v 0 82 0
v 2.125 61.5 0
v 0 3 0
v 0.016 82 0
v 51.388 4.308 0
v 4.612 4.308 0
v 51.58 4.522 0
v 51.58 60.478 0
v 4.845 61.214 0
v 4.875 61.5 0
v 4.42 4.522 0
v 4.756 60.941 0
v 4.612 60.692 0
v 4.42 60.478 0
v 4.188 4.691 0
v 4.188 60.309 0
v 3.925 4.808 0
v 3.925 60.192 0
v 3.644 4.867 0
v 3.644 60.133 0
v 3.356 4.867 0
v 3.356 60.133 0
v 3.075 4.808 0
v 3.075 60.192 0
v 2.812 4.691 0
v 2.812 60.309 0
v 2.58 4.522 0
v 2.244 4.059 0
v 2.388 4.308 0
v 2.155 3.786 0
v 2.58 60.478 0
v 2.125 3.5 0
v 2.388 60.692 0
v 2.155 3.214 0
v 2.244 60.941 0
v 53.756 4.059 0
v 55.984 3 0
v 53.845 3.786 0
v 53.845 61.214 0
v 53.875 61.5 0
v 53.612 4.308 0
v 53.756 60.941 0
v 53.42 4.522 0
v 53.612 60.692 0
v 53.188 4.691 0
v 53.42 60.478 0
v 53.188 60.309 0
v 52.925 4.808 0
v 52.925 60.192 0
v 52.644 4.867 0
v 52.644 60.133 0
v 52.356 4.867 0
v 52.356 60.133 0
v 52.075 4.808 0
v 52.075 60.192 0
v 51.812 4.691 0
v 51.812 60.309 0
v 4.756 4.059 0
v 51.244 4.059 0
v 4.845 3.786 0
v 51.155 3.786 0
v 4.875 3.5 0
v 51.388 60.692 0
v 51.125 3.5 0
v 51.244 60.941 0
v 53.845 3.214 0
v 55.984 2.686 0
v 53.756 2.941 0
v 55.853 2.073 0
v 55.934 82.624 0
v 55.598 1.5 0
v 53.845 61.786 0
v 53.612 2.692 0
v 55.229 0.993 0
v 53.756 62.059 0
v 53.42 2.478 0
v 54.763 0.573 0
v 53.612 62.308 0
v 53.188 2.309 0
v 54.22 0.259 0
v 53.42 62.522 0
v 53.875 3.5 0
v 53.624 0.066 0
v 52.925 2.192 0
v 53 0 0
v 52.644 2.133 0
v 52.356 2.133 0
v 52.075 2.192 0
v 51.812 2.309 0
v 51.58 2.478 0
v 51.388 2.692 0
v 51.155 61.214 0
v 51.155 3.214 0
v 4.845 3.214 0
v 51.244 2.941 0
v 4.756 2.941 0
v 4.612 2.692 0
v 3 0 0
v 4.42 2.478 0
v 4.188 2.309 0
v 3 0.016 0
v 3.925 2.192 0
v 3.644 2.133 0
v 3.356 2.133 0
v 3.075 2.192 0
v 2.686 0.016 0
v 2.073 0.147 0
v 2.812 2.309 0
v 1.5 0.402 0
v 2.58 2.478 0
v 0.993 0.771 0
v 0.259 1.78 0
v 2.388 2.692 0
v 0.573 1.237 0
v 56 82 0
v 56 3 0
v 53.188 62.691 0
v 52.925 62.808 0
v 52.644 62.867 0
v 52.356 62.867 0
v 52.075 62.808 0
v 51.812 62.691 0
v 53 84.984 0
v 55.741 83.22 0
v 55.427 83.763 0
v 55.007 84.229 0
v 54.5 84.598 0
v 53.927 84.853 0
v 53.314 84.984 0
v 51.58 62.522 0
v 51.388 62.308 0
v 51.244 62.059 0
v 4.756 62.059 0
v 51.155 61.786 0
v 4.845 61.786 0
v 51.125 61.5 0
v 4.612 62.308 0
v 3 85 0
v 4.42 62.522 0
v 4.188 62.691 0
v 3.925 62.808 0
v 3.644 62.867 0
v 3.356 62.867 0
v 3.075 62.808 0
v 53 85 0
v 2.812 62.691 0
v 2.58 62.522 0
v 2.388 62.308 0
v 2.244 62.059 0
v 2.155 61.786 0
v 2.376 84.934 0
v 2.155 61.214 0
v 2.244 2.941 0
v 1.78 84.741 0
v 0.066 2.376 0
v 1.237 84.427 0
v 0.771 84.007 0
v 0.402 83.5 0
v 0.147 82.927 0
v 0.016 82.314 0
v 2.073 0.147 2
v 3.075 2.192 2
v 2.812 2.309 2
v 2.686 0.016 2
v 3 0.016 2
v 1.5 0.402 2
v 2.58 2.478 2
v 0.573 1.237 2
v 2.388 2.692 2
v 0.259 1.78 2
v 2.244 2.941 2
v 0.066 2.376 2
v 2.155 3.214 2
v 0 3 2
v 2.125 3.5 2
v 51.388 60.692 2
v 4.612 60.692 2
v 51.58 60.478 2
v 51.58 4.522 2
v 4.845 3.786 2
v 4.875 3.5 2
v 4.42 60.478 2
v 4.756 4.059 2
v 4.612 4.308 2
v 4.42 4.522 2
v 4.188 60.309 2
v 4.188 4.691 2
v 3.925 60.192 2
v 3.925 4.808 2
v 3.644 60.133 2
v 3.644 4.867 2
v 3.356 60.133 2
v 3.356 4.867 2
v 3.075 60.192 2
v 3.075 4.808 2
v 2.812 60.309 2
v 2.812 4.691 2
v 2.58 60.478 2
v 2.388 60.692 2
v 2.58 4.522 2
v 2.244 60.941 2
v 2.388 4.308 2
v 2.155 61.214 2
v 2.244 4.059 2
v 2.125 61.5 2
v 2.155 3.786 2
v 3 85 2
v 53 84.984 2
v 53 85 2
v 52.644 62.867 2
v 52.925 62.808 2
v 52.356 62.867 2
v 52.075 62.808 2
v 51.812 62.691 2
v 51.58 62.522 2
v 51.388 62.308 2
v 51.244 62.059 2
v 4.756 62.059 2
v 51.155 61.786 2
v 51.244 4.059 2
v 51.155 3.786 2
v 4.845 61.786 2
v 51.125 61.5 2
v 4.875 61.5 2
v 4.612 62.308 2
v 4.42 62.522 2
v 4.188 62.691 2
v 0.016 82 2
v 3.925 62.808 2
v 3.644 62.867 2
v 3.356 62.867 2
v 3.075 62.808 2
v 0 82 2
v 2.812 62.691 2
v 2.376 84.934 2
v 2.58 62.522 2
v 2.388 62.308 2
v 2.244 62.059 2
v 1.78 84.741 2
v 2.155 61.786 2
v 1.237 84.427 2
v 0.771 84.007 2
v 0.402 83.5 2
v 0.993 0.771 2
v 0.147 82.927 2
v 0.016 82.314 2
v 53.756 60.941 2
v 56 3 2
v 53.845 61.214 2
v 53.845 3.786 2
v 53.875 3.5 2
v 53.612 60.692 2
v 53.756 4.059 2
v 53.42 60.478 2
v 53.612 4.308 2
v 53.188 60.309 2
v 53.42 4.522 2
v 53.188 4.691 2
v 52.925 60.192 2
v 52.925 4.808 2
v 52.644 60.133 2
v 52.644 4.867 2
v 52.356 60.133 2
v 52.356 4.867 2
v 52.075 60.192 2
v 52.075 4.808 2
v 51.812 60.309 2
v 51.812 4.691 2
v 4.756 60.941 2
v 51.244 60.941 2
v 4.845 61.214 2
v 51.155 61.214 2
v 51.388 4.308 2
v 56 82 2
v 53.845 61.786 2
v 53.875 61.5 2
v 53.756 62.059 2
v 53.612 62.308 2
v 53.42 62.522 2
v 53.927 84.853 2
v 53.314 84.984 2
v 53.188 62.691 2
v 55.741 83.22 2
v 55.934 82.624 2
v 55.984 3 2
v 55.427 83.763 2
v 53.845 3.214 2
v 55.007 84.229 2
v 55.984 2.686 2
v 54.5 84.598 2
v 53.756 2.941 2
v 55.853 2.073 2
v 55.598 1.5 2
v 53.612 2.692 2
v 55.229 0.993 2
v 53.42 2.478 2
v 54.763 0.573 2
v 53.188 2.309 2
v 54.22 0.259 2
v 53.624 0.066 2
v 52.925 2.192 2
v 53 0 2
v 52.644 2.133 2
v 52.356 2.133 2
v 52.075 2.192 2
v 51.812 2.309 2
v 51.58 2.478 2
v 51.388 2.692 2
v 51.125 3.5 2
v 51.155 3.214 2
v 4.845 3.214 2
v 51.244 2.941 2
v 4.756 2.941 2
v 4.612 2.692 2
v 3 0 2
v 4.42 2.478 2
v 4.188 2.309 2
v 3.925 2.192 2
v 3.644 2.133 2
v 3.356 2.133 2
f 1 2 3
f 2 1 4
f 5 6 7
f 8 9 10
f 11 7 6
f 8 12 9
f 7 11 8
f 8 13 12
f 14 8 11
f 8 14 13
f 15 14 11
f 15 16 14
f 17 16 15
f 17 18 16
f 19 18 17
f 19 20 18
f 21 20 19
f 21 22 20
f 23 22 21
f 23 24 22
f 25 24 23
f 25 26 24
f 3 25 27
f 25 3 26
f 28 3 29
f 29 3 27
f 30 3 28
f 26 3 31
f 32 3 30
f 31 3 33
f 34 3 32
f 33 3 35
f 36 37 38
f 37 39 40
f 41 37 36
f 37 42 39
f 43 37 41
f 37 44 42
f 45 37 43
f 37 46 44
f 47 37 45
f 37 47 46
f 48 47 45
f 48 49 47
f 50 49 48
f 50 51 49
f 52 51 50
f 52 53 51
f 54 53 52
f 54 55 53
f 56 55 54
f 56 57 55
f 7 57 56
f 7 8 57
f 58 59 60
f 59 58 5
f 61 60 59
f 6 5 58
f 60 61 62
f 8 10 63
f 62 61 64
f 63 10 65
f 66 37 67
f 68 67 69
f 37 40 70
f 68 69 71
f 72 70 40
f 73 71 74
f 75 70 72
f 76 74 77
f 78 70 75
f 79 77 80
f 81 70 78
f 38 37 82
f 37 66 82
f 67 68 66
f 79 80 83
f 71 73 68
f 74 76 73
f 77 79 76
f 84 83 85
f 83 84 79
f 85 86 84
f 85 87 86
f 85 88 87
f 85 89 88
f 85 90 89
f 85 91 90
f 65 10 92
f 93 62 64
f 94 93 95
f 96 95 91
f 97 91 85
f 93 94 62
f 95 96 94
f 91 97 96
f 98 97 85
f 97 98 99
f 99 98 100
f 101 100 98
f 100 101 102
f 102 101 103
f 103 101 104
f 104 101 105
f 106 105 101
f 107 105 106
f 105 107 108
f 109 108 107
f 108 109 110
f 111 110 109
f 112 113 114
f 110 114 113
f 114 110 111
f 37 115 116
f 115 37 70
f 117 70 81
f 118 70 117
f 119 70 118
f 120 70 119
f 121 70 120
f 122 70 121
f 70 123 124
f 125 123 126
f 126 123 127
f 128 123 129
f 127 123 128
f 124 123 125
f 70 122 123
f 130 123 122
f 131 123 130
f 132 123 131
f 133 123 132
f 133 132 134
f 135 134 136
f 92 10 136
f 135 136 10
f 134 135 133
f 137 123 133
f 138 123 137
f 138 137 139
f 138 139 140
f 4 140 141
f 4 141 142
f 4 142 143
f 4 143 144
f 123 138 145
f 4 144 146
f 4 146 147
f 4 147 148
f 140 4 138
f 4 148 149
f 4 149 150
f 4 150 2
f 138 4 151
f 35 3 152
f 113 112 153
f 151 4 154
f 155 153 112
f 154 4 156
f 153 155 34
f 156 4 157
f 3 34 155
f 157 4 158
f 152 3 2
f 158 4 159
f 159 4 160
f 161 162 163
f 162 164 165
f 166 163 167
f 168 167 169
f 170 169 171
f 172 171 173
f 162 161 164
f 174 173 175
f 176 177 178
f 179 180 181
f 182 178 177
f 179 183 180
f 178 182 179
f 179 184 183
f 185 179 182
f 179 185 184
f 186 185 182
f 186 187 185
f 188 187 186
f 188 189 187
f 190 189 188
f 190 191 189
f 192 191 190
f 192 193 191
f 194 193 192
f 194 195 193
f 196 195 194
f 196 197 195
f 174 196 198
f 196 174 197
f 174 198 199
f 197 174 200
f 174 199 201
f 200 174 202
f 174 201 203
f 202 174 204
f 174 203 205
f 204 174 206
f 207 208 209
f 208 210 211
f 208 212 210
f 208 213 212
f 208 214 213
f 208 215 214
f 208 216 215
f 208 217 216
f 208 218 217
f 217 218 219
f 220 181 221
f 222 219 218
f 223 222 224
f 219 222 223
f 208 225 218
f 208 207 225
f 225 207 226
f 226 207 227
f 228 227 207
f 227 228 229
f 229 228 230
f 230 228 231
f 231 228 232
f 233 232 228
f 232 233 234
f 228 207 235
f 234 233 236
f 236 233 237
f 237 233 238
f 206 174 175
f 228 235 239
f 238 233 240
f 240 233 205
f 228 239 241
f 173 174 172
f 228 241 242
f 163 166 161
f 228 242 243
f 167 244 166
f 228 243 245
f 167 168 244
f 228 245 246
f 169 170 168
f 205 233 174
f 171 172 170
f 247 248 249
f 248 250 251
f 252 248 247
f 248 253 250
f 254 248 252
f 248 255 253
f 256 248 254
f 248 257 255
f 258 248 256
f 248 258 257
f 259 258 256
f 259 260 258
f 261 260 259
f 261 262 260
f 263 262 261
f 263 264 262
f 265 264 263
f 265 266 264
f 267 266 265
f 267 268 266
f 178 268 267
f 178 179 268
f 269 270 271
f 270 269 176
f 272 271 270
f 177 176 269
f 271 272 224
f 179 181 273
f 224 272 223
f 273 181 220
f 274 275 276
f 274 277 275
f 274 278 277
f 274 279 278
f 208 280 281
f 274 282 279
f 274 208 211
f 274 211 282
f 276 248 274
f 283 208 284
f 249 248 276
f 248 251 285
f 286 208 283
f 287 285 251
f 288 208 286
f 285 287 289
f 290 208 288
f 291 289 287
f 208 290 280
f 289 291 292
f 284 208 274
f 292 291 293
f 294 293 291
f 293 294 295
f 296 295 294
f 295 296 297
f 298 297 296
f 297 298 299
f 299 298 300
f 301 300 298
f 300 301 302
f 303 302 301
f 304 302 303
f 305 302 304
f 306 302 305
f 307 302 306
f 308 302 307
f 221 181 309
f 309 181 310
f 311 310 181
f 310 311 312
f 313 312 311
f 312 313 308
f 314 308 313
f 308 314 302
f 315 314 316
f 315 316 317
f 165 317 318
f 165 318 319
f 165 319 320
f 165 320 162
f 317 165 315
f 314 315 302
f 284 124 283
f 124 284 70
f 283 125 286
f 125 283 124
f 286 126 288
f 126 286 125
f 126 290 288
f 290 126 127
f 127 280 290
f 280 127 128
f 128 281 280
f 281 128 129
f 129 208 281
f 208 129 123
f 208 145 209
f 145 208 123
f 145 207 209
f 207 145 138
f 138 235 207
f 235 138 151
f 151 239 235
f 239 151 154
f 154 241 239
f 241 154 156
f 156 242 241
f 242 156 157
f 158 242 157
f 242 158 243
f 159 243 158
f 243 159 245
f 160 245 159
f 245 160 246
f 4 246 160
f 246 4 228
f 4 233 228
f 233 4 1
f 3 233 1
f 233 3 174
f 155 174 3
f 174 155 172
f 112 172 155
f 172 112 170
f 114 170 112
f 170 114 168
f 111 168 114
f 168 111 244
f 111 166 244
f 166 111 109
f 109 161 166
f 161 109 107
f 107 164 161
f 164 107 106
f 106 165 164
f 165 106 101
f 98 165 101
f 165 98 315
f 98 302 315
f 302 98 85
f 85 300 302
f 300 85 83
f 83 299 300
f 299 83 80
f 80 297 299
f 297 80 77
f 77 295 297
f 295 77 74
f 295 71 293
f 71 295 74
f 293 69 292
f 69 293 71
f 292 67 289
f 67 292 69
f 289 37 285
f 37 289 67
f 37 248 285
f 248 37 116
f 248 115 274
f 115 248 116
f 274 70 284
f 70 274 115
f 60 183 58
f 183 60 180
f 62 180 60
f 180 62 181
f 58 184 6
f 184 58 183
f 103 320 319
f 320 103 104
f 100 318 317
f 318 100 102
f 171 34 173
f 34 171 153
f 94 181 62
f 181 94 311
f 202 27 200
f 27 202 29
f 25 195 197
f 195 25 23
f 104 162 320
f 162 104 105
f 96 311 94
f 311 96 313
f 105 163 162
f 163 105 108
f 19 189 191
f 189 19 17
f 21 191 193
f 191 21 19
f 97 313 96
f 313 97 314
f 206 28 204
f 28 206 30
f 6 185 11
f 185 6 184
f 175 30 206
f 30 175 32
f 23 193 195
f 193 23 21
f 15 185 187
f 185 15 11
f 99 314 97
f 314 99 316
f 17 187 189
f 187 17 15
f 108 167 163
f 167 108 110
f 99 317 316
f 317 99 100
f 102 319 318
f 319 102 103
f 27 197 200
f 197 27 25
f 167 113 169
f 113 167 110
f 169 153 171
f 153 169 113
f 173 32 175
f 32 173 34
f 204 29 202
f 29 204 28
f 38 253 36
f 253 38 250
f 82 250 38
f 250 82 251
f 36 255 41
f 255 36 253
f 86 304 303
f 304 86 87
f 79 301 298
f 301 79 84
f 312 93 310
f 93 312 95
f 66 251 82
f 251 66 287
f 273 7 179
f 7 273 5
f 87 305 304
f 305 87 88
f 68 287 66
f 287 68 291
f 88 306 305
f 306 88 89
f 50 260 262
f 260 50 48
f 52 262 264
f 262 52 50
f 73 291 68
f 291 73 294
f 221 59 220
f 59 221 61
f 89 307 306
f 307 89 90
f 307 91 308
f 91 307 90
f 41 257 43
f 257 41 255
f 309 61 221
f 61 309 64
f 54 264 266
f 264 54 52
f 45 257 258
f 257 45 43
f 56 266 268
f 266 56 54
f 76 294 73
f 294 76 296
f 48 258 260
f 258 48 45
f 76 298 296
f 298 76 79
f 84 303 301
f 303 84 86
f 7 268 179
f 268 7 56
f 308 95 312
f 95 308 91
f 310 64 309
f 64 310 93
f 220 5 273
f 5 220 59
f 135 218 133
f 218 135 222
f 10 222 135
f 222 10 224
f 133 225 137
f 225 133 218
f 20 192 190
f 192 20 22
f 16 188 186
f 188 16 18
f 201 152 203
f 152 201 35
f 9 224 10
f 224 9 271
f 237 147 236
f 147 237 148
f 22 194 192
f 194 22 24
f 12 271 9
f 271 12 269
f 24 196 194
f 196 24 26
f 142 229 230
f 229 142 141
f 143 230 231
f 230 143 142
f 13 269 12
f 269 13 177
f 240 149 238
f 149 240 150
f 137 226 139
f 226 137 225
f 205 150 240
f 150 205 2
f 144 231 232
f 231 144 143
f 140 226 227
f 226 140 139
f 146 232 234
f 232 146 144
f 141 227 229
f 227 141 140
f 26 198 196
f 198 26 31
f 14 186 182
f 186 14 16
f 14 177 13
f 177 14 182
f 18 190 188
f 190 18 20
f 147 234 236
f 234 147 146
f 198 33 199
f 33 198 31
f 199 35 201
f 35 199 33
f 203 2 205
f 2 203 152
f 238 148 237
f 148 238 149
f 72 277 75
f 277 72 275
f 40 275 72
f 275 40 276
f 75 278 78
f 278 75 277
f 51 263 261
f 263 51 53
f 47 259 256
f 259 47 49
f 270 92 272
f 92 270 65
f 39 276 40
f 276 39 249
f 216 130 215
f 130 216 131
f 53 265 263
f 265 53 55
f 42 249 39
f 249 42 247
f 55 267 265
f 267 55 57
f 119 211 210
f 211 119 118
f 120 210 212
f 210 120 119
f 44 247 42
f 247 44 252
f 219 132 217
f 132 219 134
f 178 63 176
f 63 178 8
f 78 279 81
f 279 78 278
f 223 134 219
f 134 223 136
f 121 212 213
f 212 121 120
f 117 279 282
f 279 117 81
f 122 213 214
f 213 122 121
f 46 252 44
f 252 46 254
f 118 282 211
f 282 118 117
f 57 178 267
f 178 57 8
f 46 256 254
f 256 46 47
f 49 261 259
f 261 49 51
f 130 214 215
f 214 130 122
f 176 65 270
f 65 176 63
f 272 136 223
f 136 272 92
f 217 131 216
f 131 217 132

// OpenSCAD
/*
Rasperrby Pi B+

James Brandreth
*/



// PCB Dimensions
width = 56;
length = 85;
depth = 2;

circle_quality = 0.1;

module corner_chamfer(radius){
    difference() {
        square([radius,radius]);
        circle(r=radius, $fs=circle_quality);
    };
}

module rounded_square(dims, radius) {
    difference() {
        square(dims);
        rotate(180) translate([-radius,-radius]) corner_chamfer(radius);
        translate([dims[0]-radius, radius])rotate(270) corner_chamfer(radius);
        translate([radius, dims[1]-radius])rotate(90)  corner_chamfer(radius);
        translate([dims[0]-radius, dims[1]-radius]) corner_chamfer(radius);
    }
}

module hole() {
    cylinder(d=2.75, h=depth+2, $fs=circle_quality);
}

module board() {
    difference() {
        color("green")  linear_extrude(height = depth) rounded_square([width,length], 3);
        translate([3.5, 3.5,-1]) hole();
        translate([width-3.5, 3.5,-1]) hole();
        translate([3.5, 3.5+58,-1]) hole();
        translate([width-3.5, 3.5+58,-1]) hole();
    }
}

board();
